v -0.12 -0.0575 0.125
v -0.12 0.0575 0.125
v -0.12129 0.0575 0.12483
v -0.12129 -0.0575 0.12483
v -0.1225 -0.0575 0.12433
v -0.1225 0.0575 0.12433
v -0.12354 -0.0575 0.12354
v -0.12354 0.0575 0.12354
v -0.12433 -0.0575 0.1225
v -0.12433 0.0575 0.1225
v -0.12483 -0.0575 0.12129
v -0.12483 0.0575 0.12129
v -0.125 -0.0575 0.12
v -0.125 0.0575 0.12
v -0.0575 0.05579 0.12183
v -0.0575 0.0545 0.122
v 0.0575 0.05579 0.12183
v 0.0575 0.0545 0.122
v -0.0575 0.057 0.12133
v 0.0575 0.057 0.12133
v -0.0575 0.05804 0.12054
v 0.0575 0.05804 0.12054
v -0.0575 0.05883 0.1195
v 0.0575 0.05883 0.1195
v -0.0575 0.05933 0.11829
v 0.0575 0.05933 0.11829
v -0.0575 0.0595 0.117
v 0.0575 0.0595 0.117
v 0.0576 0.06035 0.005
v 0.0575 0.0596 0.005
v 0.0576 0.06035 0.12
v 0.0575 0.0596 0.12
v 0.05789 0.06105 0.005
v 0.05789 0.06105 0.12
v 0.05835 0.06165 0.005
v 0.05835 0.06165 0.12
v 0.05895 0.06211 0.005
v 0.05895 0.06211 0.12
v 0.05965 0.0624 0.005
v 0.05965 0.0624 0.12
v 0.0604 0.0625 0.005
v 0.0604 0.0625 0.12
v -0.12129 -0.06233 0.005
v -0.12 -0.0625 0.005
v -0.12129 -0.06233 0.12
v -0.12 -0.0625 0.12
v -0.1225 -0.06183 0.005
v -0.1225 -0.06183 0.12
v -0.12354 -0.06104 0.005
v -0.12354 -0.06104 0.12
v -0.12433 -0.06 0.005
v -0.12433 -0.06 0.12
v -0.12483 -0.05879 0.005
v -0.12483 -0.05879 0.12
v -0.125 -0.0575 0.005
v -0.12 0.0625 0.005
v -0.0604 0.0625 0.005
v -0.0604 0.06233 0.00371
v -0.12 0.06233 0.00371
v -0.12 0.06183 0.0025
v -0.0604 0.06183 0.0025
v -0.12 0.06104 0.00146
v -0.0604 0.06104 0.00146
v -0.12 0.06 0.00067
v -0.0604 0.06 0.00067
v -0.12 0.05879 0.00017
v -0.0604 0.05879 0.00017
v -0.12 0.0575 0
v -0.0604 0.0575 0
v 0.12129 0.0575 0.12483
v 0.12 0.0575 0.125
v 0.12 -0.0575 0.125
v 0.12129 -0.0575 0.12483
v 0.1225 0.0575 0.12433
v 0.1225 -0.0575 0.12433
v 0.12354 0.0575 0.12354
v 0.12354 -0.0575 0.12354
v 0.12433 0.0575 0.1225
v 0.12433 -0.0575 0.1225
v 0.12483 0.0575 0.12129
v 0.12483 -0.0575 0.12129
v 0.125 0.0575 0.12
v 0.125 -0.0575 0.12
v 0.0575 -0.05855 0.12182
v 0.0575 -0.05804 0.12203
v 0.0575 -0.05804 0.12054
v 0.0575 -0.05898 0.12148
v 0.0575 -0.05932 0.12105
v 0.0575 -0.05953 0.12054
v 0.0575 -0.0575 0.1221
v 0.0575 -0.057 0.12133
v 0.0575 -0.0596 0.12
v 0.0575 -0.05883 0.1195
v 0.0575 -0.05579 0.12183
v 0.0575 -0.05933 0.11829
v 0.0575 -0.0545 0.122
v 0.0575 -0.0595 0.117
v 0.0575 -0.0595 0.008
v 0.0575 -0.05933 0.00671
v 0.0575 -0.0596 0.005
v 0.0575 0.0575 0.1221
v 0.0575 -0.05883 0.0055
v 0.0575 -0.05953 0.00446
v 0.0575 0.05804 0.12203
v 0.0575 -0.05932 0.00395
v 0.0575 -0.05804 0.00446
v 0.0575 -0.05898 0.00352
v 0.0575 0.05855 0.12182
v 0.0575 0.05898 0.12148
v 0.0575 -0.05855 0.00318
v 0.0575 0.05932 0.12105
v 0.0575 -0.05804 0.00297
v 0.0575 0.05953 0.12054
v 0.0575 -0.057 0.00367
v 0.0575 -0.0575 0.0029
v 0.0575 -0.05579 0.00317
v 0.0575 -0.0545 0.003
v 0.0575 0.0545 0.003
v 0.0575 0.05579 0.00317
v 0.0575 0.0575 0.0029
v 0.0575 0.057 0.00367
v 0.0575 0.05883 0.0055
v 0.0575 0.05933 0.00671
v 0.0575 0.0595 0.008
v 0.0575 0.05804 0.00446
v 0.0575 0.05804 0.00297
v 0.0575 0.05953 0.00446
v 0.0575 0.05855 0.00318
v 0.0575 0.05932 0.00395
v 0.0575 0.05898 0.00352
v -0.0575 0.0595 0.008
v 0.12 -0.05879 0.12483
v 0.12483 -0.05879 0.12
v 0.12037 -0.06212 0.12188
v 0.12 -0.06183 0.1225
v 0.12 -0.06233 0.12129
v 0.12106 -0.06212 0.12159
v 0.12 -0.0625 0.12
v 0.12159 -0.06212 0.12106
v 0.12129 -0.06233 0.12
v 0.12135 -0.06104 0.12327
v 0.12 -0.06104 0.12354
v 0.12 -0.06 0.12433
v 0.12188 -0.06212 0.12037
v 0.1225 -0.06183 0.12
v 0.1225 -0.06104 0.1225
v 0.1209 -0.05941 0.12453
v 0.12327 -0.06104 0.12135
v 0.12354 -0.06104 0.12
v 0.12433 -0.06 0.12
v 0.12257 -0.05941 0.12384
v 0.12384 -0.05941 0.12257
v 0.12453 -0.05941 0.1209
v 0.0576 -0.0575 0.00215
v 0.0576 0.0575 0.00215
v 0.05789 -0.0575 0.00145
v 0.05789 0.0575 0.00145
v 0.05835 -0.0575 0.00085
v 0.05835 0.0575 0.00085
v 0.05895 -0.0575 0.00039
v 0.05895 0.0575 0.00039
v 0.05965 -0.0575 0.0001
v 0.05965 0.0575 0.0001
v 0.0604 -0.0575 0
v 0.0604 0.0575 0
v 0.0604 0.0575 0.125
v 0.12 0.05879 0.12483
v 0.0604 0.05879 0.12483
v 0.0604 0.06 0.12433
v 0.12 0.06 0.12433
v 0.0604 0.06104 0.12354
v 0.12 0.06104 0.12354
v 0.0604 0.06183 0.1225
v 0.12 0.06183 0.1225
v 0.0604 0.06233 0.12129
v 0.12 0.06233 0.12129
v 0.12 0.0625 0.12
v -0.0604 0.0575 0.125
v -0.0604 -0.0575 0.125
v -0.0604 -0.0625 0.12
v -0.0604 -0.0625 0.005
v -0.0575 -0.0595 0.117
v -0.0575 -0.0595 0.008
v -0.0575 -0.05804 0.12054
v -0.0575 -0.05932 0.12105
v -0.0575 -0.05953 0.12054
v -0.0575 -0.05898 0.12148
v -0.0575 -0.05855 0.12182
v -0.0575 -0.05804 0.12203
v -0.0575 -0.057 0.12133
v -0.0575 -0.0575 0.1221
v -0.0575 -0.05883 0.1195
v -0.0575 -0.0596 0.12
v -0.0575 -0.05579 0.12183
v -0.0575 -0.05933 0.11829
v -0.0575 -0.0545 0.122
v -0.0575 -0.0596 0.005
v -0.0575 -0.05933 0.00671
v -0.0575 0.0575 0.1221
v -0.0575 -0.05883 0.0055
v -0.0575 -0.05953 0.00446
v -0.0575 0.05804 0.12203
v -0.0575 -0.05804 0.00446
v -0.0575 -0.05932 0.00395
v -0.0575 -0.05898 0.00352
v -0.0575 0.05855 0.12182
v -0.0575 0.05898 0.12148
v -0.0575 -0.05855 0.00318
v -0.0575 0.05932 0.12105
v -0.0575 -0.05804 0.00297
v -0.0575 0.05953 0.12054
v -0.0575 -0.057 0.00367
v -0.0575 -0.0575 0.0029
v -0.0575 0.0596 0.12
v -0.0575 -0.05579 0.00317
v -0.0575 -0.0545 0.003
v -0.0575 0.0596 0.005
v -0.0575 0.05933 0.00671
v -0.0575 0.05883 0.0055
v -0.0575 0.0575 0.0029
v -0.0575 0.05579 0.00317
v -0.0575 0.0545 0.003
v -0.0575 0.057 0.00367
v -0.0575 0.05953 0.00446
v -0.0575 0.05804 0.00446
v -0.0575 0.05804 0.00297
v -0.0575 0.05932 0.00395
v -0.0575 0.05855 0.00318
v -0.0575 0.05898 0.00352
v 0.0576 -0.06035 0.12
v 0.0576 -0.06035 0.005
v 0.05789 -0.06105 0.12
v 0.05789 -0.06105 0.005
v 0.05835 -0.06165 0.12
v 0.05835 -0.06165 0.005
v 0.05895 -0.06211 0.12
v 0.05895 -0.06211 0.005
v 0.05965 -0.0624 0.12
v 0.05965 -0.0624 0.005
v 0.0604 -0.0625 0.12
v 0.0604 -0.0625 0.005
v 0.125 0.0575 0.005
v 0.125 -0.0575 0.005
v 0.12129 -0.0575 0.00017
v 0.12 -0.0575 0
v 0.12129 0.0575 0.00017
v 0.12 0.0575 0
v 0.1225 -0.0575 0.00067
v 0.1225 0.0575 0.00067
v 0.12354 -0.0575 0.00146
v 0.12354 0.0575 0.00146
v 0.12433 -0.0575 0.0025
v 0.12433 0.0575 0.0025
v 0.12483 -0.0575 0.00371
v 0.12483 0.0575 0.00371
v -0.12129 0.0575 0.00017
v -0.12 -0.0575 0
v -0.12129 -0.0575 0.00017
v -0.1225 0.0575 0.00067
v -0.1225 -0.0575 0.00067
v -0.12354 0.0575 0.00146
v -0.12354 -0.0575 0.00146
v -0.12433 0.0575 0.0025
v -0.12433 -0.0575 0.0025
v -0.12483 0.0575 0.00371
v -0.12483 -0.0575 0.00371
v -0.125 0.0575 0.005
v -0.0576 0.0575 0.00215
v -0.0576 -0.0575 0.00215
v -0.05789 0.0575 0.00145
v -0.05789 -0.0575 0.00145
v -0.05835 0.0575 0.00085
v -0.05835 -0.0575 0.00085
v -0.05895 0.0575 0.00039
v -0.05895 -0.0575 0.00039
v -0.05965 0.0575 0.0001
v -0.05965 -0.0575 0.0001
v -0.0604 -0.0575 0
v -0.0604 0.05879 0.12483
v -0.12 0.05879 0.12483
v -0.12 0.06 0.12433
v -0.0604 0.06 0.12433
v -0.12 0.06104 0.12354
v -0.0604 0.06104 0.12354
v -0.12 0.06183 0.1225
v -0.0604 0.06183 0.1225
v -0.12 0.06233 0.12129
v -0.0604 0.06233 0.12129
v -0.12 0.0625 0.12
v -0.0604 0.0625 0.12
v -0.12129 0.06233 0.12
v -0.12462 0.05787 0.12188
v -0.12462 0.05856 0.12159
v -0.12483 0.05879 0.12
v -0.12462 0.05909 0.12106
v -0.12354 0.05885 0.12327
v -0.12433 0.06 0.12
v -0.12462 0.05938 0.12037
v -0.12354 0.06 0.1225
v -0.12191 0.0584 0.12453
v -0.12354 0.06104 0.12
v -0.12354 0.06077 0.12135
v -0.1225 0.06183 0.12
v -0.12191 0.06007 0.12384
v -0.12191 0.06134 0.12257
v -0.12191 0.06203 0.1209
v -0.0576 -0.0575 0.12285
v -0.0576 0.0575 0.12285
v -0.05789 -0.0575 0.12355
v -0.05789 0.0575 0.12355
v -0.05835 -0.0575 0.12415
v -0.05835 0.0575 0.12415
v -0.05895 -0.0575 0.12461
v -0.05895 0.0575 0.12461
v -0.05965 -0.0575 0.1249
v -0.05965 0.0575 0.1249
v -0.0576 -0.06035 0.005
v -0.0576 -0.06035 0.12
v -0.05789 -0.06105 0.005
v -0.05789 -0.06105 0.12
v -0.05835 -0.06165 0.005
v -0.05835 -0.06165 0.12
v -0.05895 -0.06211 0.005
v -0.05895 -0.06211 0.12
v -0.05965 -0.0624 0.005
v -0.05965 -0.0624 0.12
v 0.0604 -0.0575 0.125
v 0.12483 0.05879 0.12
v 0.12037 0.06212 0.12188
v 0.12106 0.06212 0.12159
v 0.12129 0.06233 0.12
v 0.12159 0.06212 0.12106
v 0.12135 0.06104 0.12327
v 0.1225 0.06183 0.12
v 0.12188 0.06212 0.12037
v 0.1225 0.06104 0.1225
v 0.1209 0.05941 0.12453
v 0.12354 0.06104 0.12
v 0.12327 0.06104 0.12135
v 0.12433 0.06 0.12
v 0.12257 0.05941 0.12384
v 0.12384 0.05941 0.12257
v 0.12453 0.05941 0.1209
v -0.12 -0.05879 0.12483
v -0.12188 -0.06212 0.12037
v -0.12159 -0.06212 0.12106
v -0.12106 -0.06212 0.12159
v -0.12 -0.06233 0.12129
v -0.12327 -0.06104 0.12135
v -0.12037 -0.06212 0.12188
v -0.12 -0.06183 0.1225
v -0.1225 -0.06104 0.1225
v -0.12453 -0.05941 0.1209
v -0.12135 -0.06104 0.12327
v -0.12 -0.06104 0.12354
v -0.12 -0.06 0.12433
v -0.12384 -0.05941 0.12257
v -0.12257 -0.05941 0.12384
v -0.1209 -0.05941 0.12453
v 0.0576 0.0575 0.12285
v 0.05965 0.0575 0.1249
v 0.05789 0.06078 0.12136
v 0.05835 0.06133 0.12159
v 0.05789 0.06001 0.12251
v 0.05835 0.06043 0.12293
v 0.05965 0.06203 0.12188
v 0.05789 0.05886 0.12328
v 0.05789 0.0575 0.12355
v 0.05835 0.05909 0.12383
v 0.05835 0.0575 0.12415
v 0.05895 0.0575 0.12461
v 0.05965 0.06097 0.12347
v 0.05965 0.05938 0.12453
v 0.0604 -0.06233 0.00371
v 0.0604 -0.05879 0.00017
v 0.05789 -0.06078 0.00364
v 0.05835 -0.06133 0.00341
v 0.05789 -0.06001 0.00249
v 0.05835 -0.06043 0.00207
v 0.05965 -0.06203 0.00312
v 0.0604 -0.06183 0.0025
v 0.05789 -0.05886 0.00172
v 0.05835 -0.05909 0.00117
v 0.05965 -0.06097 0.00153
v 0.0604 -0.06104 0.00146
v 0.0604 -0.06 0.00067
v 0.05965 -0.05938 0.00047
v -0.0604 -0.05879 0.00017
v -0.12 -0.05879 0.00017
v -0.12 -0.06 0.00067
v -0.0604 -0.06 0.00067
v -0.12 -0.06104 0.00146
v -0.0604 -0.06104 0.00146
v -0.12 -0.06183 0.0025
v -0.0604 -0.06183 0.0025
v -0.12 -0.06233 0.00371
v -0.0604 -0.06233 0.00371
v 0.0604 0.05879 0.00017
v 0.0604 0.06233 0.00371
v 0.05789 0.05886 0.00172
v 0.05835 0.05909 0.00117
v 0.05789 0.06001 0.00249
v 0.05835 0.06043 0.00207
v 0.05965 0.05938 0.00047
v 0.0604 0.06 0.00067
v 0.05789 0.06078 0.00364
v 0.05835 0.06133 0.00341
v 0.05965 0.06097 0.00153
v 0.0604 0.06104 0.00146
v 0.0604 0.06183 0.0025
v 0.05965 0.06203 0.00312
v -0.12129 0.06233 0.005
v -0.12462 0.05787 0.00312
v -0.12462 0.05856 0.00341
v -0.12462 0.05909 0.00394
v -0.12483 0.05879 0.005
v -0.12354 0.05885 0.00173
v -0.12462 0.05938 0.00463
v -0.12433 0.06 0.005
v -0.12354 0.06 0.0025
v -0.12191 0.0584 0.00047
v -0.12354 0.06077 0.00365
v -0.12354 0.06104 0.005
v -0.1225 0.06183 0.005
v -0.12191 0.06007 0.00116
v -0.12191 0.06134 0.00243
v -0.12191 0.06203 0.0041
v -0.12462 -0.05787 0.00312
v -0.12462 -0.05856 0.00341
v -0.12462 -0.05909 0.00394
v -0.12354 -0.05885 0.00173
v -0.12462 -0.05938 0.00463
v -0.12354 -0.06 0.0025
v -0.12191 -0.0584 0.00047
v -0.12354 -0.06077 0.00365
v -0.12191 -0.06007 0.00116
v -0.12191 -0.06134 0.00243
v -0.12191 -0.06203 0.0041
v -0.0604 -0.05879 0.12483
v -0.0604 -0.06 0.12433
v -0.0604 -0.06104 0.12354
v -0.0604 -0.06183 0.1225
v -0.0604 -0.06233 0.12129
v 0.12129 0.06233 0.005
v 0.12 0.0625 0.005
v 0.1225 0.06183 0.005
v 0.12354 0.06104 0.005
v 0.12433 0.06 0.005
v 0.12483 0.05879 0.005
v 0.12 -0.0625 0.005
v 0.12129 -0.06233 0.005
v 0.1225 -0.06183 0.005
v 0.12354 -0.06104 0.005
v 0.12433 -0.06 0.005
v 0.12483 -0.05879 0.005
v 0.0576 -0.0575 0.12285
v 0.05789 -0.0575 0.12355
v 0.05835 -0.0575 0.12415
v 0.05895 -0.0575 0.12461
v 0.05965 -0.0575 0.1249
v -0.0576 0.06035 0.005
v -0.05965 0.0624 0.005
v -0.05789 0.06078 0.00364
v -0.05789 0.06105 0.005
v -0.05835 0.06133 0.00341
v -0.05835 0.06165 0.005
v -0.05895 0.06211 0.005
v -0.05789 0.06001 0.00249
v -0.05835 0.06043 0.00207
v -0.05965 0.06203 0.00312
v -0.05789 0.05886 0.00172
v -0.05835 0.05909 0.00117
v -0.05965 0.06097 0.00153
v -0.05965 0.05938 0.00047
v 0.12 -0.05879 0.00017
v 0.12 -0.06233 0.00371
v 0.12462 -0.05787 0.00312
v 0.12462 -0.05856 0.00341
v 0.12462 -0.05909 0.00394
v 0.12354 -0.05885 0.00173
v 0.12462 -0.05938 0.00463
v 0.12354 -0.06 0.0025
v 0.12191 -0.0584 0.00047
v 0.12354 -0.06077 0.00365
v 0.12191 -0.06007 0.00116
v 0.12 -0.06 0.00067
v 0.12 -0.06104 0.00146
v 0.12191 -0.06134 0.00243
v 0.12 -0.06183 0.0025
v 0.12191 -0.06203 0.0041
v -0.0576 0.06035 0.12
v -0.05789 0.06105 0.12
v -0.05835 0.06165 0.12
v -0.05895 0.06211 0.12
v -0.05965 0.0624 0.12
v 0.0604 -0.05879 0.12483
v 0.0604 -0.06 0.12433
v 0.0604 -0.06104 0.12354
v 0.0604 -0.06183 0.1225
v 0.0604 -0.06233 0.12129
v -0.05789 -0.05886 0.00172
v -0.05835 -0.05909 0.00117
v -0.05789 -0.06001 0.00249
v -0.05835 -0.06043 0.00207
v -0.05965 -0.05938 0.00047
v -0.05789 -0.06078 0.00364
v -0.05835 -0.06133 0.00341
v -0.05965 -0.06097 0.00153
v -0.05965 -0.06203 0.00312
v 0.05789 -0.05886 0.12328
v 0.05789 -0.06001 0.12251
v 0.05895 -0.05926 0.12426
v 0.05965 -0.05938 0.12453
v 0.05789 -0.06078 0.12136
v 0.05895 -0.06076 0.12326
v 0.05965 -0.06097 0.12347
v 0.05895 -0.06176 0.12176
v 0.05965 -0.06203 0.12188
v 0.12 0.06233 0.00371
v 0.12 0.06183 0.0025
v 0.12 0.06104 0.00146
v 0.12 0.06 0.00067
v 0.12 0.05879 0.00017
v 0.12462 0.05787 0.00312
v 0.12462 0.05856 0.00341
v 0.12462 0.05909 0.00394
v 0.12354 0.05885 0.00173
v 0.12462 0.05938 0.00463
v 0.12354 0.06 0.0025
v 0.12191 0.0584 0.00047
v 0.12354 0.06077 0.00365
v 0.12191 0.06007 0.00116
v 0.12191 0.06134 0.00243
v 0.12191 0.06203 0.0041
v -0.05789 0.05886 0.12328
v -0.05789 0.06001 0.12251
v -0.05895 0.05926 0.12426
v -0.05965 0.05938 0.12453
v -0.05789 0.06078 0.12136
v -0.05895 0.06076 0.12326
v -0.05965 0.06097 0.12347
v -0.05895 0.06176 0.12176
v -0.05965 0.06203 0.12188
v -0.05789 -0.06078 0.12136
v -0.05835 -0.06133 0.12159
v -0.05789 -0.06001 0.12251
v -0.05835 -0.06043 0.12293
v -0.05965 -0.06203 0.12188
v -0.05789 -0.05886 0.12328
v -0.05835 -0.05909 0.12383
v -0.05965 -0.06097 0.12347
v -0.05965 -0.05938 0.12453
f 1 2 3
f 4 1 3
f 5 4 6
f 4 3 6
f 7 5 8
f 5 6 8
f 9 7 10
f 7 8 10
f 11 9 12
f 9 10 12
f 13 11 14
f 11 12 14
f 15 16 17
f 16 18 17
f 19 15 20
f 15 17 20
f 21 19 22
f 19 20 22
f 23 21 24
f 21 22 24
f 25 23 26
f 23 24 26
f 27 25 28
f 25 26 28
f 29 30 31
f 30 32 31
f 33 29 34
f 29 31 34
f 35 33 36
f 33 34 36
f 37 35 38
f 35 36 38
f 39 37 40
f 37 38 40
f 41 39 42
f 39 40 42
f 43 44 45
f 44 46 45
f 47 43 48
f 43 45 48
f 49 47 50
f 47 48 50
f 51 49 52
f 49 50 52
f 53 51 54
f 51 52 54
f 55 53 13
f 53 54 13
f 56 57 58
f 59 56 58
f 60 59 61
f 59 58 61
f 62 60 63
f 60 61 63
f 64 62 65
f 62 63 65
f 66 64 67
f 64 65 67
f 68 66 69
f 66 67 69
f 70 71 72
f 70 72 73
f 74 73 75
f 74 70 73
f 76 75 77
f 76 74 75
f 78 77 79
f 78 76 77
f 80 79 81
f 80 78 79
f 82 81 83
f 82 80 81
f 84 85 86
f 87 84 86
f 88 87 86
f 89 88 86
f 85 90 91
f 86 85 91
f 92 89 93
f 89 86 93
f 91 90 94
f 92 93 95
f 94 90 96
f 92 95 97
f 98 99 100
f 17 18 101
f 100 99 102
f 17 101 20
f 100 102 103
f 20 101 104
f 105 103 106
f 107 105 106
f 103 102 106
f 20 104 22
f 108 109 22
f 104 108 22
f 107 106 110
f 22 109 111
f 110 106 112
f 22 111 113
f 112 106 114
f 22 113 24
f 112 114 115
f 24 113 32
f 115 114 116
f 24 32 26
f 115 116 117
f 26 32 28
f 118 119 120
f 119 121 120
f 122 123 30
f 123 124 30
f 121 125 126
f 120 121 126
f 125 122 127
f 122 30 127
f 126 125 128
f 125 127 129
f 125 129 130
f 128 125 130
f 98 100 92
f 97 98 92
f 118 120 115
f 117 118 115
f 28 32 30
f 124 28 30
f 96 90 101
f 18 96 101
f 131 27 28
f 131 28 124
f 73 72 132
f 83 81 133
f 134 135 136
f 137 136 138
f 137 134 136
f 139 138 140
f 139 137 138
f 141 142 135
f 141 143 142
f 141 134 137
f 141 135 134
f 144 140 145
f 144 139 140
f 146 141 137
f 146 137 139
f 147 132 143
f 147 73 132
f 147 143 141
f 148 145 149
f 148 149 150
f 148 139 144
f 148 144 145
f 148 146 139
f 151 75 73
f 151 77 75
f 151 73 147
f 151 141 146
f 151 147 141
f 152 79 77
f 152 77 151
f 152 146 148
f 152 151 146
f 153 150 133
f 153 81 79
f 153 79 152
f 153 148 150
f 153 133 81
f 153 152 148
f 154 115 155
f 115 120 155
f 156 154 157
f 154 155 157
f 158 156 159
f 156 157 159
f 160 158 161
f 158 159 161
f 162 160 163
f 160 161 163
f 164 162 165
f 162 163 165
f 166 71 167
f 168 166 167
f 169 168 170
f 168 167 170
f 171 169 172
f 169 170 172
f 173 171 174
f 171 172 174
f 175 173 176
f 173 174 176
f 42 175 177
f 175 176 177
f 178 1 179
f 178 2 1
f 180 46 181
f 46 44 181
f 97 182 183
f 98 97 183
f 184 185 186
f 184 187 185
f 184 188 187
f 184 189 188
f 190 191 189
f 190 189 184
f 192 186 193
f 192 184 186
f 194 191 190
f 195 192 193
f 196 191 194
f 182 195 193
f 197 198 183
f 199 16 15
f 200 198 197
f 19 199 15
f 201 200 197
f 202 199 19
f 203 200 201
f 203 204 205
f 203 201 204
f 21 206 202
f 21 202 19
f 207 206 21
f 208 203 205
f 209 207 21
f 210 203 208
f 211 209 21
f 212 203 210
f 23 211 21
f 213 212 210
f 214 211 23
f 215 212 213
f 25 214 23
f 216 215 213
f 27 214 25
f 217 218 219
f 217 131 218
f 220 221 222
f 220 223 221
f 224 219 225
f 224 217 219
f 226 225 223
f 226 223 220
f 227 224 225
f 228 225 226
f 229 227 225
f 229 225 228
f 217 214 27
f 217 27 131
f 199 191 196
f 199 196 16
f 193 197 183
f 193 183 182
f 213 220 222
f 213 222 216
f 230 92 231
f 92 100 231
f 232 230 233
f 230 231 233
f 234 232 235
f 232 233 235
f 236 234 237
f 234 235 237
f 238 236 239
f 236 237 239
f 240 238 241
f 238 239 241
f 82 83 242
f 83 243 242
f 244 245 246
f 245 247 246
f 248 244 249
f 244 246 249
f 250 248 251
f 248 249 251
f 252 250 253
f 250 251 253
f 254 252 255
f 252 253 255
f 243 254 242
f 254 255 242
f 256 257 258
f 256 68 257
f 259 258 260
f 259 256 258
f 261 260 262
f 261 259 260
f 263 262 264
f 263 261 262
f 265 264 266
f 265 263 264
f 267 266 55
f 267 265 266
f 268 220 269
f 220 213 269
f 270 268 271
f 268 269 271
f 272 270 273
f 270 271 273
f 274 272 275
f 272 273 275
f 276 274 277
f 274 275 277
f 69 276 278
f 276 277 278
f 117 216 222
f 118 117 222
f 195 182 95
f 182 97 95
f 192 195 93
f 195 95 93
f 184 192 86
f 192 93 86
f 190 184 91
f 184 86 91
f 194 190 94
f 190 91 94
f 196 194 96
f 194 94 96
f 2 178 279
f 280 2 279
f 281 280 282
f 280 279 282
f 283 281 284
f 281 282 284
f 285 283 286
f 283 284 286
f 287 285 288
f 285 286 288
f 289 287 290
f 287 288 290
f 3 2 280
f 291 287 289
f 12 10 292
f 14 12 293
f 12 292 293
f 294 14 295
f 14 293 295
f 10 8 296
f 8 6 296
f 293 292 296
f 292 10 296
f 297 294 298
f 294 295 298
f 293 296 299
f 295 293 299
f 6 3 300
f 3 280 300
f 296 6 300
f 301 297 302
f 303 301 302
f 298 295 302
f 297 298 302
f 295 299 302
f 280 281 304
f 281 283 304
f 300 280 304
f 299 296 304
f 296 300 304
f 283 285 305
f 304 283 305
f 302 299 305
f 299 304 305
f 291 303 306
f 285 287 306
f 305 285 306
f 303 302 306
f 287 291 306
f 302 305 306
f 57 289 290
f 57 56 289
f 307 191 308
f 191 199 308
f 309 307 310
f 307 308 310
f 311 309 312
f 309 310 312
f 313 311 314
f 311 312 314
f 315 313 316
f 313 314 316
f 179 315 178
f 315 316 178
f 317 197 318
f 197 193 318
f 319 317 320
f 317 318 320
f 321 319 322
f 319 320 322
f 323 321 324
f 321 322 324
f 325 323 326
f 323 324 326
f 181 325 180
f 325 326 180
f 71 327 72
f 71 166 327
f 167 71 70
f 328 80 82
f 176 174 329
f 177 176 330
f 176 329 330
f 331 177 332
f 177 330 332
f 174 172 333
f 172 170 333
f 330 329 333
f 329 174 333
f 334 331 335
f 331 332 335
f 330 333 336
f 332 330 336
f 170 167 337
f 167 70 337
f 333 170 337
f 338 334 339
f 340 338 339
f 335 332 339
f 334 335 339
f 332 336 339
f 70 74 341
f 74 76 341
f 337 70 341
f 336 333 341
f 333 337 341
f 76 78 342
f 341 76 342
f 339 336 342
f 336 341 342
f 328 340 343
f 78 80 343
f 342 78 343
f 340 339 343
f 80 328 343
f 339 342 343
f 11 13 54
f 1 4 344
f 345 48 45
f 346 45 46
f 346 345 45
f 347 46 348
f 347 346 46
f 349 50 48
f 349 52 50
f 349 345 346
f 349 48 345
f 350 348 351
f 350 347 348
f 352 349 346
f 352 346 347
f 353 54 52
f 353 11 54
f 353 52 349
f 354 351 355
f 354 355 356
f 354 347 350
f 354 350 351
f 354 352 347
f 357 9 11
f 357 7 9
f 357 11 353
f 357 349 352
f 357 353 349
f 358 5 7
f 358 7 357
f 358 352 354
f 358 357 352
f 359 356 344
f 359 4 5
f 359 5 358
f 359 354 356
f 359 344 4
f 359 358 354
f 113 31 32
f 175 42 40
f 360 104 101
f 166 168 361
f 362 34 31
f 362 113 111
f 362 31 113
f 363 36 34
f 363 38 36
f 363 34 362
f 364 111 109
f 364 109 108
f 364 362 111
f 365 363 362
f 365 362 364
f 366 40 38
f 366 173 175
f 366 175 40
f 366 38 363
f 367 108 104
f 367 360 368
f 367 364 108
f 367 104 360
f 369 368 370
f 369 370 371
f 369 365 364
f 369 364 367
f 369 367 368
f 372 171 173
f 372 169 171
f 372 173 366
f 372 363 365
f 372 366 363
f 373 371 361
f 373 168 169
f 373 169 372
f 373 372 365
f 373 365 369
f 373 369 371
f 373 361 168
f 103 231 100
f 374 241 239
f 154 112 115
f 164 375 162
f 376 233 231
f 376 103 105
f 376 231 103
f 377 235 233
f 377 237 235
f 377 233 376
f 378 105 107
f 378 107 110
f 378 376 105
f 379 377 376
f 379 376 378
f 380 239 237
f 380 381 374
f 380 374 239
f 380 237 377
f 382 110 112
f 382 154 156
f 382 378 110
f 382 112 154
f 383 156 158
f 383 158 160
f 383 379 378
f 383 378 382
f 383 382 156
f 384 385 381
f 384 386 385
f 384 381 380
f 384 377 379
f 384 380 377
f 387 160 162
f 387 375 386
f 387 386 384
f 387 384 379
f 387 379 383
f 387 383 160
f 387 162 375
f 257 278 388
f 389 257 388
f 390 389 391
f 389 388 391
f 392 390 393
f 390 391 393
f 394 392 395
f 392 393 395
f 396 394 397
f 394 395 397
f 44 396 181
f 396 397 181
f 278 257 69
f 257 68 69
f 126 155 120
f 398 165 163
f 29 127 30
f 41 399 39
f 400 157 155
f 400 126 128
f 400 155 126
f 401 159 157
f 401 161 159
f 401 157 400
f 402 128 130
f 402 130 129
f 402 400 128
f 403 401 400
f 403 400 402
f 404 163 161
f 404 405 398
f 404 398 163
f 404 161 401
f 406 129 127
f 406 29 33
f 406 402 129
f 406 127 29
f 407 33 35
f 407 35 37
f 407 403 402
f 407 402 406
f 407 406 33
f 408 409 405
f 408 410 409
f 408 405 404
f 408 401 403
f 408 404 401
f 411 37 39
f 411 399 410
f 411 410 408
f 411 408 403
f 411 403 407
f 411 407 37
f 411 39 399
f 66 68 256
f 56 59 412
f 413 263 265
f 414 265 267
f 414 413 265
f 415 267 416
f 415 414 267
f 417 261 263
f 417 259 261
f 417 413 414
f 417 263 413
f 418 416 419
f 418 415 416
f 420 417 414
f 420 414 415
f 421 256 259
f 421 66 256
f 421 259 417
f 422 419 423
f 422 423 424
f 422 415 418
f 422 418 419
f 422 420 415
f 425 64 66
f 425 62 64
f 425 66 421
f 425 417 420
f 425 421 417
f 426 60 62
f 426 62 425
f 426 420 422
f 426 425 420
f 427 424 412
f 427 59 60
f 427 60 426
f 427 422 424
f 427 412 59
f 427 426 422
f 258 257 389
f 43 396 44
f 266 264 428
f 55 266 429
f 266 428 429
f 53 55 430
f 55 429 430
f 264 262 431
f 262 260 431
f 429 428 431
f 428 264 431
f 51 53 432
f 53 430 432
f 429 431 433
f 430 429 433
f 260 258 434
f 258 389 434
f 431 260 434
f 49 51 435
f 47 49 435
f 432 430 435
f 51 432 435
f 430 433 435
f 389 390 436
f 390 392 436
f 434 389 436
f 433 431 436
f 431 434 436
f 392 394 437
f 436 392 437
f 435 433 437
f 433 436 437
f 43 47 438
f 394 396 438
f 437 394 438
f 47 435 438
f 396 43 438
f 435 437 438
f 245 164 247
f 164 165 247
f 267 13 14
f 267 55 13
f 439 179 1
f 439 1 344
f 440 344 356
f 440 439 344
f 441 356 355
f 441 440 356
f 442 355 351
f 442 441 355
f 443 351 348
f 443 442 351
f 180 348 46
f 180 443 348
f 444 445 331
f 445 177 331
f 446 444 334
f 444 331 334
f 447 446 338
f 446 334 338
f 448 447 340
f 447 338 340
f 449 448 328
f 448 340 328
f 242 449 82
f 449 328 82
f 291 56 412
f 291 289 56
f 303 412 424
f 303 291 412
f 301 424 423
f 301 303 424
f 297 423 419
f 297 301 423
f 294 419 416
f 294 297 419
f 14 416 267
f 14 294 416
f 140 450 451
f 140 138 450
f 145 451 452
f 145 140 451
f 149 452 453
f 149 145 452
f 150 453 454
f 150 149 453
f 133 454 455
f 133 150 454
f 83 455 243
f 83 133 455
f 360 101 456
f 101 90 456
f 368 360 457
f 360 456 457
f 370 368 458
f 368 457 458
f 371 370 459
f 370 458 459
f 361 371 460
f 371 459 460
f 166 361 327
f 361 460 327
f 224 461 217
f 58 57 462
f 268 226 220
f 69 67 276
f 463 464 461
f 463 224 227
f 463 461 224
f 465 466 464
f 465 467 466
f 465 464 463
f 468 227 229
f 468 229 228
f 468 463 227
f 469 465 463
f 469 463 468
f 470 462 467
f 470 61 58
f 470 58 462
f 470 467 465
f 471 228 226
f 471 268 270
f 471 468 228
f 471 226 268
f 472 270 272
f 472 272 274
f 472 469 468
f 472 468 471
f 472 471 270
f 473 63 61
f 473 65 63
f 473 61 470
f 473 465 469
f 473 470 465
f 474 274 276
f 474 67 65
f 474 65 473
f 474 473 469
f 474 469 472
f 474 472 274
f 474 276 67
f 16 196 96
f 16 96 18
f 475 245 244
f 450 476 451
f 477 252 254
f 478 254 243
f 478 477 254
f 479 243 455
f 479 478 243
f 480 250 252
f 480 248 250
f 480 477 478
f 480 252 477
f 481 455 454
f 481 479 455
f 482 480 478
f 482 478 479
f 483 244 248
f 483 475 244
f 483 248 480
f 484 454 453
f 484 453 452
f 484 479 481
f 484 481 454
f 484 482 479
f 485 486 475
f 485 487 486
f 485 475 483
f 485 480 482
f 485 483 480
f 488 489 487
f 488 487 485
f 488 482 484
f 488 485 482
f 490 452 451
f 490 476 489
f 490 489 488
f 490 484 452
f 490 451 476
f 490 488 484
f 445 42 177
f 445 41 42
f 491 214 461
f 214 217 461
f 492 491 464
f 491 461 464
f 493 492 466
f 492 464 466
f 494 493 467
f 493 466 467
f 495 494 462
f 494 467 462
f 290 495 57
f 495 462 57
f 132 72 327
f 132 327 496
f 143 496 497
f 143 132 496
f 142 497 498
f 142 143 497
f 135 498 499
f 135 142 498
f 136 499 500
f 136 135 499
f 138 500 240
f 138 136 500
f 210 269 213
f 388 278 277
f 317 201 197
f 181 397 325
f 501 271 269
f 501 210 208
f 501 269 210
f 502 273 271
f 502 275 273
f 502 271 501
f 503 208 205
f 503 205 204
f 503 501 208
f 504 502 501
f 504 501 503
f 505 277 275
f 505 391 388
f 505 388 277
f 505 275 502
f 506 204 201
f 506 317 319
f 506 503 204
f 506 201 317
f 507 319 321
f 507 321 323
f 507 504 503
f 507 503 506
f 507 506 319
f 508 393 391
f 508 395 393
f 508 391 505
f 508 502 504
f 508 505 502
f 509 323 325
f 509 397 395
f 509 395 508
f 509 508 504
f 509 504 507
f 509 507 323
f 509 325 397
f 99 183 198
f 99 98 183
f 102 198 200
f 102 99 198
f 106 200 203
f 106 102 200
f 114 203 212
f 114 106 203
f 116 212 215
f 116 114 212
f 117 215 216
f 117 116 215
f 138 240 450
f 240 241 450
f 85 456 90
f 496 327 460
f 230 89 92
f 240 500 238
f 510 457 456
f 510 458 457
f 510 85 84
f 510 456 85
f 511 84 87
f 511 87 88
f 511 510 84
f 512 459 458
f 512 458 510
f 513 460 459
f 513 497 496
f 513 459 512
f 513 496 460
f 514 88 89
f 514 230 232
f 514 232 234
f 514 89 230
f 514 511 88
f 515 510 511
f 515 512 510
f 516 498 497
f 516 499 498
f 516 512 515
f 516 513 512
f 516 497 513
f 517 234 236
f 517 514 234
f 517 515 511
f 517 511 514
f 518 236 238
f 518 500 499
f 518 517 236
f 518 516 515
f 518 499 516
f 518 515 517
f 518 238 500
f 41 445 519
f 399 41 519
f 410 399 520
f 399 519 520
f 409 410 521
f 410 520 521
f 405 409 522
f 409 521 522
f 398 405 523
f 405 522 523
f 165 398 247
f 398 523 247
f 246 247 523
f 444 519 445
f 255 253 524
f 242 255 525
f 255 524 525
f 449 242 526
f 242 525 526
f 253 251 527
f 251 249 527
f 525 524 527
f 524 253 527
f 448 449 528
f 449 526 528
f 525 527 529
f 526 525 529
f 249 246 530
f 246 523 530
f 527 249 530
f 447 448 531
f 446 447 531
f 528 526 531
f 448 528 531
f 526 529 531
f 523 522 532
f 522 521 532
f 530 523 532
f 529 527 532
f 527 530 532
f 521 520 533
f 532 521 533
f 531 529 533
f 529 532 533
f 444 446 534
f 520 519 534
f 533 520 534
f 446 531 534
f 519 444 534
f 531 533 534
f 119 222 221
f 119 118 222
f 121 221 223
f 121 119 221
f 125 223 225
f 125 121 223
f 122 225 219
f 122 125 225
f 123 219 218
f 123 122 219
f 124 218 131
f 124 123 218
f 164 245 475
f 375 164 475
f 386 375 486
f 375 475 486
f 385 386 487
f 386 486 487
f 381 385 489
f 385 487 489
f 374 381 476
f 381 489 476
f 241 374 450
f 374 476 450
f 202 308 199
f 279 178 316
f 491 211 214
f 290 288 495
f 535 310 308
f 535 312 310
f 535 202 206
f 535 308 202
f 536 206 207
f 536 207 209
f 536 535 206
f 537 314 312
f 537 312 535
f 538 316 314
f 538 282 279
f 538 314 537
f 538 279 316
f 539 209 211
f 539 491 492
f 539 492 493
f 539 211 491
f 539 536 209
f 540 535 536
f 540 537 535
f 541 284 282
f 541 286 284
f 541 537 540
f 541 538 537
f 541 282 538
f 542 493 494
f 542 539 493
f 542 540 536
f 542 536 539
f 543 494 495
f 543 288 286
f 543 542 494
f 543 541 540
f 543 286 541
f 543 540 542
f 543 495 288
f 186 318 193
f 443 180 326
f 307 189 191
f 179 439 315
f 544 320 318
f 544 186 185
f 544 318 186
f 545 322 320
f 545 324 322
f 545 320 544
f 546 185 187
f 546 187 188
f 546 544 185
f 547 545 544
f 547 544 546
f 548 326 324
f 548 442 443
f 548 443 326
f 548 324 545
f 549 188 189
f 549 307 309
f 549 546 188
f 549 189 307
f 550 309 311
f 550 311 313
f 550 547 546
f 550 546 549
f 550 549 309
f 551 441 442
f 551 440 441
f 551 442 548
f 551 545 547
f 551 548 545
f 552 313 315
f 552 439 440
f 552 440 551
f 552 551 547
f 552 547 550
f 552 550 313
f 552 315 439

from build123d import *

# Parameters (mm, degrees)
SKETCH1_W                           = 0.25
SKETCH1_H                           = 0.125
ALL_BODY_DEPTH                      = 0.125
CUT_OUT_THE_BODY_FOR_PIN_DEPTH      = 0.0575
CUT_OUT_THE_BODY_FOR_PIN_DEPTH_BACK = 0.0575
SKETCH2_OUTSIDE_W                   = 2.187
SKETCH2_OUTSIDE_H                   = 2.186
SKETCH2_OUTSIDE_W_2                 = 0.119
SKETCH2_OUTSIDE_H_2                 = 0.119
BODY_FILLET_R                       = 0.005
PIN_FILLET_A_R                      = 0.005
PIN_FILLET_B_R                      = 0.003


with BuildPart() as part:
    # Sketch1 → All body (new body)
    with BuildSketch(Plane.XY):
        Rectangle(SKETCH1_W, SKETCH1_H)
    extrude(amount=ALL_BODY_DEPTH)

    # Sketch2 outside → Cut out the body for pin (cut, two sides: drawn at the far end of the back side and taken through both)
    with BuildSketch(Plane(origin=(0, 0, 0), x_dir=(0, 0, -1), z_dir=(1, 0, 0)).offset(-CUT_OUT_THE_BODY_FOR_PIN_DEPTH_BACK)):
        with Locations((-0.0625, 0)):
            Rectangle(SKETCH2_OUTSIDE_W, SKETCH2_OUTSIDE_H)
        with Locations((-0.0625, 0)):
            Rectangle(SKETCH2_OUTSIDE_W_2, SKETCH2_OUTSIDE_H_2, mode=Mode.SUBTRACT)
    extrude(amount=CUT_OUT_THE_BODY_FOR_PIN_DEPTH + CUT_OUT_THE_BODY_FOR_PIN_DEPTH_BACK, mode=Mode.SUBTRACT)

    # Body fillet
    body_fillet_edges = [part.edges().sort_by_distance(p)[0] for p in [
        (0, 0.0595, 0.003),
        (0, 0.0595, 0.122),
        (0, -0.0595, 0.122),
        (0, -0.0595, 0.003),
    ]]
    fillet(body_fillet_edges, radius=BODY_FILLET_R)

    # Pin fillet a
    pin_fillet_a_edges = [part.edges().sort_by_distance(p)[0] for p in [
        (0.125, 0, 0.125),
        (-0.09125, 0.0625, 0),
        (0.09125, -0.0625, 0),
        (0.09125, -0.0625, 0.125),
        (-0.09125, 0.0625, 0.125),
        (0.09125, 0.0625, 0.125),
        (-0.125, 0, 0.125),
        (0.09125, 0.0625, 0),
        (0.125, 0, 0),
        (-0.09125, -0.0625, 0),
        (-0.125, 0, 0),
        (-0.125, 0.0625, 0.0625),
        (0.125, 0.0625, 0.0625),
        (0.125, -0.0625, 0.0625),
        (-0.125, -0.0625, 0.0625),
        (-0.09125, -0.0625, 0.125),
    ]]
    fillet(pin_fillet_a_edges, radius=PIN_FILLET_A_R)

    # Pin fillet b
    pin_fillet_b_edges = [part.edges().sort_by_distance(p)[0] for p in [
        (0.0575, -0.0625, 0.0625),
        (0.0575, 0, 0.125),
        (0.0575, 0.0625, 0.0625),
        (0.0575, 0, 0),
        (-0.0575, 0.0625, 0.0625),
        (-0.0575, 0, 0.125),
        (-0.0575, -0.0625, 0.0625),
        (-0.0575, 0, 0),
        (0.0575, 0.061035534, 0.001464466),
        (0.0575, -0.061035534, 0.001464466),
        (0.0575, -0.061035534, 0.123535534),
        (0.0575, 0.061035534, 0.123535534),
        (-0.0575, -0.061035534, 0.123535534),
        (-0.0575, 0.061035534, 0.123535534),
        (-0.0575, -0.061035534, 0.001464466),
        (-0.0575, 0.061035534, 0.001464466),
    ]]
    fillet(pin_fillet_b_edges, radius=PIN_FILLET_B_R - 0.0001)  # a hair under: the kernel refuses the full size


solid = part.part
